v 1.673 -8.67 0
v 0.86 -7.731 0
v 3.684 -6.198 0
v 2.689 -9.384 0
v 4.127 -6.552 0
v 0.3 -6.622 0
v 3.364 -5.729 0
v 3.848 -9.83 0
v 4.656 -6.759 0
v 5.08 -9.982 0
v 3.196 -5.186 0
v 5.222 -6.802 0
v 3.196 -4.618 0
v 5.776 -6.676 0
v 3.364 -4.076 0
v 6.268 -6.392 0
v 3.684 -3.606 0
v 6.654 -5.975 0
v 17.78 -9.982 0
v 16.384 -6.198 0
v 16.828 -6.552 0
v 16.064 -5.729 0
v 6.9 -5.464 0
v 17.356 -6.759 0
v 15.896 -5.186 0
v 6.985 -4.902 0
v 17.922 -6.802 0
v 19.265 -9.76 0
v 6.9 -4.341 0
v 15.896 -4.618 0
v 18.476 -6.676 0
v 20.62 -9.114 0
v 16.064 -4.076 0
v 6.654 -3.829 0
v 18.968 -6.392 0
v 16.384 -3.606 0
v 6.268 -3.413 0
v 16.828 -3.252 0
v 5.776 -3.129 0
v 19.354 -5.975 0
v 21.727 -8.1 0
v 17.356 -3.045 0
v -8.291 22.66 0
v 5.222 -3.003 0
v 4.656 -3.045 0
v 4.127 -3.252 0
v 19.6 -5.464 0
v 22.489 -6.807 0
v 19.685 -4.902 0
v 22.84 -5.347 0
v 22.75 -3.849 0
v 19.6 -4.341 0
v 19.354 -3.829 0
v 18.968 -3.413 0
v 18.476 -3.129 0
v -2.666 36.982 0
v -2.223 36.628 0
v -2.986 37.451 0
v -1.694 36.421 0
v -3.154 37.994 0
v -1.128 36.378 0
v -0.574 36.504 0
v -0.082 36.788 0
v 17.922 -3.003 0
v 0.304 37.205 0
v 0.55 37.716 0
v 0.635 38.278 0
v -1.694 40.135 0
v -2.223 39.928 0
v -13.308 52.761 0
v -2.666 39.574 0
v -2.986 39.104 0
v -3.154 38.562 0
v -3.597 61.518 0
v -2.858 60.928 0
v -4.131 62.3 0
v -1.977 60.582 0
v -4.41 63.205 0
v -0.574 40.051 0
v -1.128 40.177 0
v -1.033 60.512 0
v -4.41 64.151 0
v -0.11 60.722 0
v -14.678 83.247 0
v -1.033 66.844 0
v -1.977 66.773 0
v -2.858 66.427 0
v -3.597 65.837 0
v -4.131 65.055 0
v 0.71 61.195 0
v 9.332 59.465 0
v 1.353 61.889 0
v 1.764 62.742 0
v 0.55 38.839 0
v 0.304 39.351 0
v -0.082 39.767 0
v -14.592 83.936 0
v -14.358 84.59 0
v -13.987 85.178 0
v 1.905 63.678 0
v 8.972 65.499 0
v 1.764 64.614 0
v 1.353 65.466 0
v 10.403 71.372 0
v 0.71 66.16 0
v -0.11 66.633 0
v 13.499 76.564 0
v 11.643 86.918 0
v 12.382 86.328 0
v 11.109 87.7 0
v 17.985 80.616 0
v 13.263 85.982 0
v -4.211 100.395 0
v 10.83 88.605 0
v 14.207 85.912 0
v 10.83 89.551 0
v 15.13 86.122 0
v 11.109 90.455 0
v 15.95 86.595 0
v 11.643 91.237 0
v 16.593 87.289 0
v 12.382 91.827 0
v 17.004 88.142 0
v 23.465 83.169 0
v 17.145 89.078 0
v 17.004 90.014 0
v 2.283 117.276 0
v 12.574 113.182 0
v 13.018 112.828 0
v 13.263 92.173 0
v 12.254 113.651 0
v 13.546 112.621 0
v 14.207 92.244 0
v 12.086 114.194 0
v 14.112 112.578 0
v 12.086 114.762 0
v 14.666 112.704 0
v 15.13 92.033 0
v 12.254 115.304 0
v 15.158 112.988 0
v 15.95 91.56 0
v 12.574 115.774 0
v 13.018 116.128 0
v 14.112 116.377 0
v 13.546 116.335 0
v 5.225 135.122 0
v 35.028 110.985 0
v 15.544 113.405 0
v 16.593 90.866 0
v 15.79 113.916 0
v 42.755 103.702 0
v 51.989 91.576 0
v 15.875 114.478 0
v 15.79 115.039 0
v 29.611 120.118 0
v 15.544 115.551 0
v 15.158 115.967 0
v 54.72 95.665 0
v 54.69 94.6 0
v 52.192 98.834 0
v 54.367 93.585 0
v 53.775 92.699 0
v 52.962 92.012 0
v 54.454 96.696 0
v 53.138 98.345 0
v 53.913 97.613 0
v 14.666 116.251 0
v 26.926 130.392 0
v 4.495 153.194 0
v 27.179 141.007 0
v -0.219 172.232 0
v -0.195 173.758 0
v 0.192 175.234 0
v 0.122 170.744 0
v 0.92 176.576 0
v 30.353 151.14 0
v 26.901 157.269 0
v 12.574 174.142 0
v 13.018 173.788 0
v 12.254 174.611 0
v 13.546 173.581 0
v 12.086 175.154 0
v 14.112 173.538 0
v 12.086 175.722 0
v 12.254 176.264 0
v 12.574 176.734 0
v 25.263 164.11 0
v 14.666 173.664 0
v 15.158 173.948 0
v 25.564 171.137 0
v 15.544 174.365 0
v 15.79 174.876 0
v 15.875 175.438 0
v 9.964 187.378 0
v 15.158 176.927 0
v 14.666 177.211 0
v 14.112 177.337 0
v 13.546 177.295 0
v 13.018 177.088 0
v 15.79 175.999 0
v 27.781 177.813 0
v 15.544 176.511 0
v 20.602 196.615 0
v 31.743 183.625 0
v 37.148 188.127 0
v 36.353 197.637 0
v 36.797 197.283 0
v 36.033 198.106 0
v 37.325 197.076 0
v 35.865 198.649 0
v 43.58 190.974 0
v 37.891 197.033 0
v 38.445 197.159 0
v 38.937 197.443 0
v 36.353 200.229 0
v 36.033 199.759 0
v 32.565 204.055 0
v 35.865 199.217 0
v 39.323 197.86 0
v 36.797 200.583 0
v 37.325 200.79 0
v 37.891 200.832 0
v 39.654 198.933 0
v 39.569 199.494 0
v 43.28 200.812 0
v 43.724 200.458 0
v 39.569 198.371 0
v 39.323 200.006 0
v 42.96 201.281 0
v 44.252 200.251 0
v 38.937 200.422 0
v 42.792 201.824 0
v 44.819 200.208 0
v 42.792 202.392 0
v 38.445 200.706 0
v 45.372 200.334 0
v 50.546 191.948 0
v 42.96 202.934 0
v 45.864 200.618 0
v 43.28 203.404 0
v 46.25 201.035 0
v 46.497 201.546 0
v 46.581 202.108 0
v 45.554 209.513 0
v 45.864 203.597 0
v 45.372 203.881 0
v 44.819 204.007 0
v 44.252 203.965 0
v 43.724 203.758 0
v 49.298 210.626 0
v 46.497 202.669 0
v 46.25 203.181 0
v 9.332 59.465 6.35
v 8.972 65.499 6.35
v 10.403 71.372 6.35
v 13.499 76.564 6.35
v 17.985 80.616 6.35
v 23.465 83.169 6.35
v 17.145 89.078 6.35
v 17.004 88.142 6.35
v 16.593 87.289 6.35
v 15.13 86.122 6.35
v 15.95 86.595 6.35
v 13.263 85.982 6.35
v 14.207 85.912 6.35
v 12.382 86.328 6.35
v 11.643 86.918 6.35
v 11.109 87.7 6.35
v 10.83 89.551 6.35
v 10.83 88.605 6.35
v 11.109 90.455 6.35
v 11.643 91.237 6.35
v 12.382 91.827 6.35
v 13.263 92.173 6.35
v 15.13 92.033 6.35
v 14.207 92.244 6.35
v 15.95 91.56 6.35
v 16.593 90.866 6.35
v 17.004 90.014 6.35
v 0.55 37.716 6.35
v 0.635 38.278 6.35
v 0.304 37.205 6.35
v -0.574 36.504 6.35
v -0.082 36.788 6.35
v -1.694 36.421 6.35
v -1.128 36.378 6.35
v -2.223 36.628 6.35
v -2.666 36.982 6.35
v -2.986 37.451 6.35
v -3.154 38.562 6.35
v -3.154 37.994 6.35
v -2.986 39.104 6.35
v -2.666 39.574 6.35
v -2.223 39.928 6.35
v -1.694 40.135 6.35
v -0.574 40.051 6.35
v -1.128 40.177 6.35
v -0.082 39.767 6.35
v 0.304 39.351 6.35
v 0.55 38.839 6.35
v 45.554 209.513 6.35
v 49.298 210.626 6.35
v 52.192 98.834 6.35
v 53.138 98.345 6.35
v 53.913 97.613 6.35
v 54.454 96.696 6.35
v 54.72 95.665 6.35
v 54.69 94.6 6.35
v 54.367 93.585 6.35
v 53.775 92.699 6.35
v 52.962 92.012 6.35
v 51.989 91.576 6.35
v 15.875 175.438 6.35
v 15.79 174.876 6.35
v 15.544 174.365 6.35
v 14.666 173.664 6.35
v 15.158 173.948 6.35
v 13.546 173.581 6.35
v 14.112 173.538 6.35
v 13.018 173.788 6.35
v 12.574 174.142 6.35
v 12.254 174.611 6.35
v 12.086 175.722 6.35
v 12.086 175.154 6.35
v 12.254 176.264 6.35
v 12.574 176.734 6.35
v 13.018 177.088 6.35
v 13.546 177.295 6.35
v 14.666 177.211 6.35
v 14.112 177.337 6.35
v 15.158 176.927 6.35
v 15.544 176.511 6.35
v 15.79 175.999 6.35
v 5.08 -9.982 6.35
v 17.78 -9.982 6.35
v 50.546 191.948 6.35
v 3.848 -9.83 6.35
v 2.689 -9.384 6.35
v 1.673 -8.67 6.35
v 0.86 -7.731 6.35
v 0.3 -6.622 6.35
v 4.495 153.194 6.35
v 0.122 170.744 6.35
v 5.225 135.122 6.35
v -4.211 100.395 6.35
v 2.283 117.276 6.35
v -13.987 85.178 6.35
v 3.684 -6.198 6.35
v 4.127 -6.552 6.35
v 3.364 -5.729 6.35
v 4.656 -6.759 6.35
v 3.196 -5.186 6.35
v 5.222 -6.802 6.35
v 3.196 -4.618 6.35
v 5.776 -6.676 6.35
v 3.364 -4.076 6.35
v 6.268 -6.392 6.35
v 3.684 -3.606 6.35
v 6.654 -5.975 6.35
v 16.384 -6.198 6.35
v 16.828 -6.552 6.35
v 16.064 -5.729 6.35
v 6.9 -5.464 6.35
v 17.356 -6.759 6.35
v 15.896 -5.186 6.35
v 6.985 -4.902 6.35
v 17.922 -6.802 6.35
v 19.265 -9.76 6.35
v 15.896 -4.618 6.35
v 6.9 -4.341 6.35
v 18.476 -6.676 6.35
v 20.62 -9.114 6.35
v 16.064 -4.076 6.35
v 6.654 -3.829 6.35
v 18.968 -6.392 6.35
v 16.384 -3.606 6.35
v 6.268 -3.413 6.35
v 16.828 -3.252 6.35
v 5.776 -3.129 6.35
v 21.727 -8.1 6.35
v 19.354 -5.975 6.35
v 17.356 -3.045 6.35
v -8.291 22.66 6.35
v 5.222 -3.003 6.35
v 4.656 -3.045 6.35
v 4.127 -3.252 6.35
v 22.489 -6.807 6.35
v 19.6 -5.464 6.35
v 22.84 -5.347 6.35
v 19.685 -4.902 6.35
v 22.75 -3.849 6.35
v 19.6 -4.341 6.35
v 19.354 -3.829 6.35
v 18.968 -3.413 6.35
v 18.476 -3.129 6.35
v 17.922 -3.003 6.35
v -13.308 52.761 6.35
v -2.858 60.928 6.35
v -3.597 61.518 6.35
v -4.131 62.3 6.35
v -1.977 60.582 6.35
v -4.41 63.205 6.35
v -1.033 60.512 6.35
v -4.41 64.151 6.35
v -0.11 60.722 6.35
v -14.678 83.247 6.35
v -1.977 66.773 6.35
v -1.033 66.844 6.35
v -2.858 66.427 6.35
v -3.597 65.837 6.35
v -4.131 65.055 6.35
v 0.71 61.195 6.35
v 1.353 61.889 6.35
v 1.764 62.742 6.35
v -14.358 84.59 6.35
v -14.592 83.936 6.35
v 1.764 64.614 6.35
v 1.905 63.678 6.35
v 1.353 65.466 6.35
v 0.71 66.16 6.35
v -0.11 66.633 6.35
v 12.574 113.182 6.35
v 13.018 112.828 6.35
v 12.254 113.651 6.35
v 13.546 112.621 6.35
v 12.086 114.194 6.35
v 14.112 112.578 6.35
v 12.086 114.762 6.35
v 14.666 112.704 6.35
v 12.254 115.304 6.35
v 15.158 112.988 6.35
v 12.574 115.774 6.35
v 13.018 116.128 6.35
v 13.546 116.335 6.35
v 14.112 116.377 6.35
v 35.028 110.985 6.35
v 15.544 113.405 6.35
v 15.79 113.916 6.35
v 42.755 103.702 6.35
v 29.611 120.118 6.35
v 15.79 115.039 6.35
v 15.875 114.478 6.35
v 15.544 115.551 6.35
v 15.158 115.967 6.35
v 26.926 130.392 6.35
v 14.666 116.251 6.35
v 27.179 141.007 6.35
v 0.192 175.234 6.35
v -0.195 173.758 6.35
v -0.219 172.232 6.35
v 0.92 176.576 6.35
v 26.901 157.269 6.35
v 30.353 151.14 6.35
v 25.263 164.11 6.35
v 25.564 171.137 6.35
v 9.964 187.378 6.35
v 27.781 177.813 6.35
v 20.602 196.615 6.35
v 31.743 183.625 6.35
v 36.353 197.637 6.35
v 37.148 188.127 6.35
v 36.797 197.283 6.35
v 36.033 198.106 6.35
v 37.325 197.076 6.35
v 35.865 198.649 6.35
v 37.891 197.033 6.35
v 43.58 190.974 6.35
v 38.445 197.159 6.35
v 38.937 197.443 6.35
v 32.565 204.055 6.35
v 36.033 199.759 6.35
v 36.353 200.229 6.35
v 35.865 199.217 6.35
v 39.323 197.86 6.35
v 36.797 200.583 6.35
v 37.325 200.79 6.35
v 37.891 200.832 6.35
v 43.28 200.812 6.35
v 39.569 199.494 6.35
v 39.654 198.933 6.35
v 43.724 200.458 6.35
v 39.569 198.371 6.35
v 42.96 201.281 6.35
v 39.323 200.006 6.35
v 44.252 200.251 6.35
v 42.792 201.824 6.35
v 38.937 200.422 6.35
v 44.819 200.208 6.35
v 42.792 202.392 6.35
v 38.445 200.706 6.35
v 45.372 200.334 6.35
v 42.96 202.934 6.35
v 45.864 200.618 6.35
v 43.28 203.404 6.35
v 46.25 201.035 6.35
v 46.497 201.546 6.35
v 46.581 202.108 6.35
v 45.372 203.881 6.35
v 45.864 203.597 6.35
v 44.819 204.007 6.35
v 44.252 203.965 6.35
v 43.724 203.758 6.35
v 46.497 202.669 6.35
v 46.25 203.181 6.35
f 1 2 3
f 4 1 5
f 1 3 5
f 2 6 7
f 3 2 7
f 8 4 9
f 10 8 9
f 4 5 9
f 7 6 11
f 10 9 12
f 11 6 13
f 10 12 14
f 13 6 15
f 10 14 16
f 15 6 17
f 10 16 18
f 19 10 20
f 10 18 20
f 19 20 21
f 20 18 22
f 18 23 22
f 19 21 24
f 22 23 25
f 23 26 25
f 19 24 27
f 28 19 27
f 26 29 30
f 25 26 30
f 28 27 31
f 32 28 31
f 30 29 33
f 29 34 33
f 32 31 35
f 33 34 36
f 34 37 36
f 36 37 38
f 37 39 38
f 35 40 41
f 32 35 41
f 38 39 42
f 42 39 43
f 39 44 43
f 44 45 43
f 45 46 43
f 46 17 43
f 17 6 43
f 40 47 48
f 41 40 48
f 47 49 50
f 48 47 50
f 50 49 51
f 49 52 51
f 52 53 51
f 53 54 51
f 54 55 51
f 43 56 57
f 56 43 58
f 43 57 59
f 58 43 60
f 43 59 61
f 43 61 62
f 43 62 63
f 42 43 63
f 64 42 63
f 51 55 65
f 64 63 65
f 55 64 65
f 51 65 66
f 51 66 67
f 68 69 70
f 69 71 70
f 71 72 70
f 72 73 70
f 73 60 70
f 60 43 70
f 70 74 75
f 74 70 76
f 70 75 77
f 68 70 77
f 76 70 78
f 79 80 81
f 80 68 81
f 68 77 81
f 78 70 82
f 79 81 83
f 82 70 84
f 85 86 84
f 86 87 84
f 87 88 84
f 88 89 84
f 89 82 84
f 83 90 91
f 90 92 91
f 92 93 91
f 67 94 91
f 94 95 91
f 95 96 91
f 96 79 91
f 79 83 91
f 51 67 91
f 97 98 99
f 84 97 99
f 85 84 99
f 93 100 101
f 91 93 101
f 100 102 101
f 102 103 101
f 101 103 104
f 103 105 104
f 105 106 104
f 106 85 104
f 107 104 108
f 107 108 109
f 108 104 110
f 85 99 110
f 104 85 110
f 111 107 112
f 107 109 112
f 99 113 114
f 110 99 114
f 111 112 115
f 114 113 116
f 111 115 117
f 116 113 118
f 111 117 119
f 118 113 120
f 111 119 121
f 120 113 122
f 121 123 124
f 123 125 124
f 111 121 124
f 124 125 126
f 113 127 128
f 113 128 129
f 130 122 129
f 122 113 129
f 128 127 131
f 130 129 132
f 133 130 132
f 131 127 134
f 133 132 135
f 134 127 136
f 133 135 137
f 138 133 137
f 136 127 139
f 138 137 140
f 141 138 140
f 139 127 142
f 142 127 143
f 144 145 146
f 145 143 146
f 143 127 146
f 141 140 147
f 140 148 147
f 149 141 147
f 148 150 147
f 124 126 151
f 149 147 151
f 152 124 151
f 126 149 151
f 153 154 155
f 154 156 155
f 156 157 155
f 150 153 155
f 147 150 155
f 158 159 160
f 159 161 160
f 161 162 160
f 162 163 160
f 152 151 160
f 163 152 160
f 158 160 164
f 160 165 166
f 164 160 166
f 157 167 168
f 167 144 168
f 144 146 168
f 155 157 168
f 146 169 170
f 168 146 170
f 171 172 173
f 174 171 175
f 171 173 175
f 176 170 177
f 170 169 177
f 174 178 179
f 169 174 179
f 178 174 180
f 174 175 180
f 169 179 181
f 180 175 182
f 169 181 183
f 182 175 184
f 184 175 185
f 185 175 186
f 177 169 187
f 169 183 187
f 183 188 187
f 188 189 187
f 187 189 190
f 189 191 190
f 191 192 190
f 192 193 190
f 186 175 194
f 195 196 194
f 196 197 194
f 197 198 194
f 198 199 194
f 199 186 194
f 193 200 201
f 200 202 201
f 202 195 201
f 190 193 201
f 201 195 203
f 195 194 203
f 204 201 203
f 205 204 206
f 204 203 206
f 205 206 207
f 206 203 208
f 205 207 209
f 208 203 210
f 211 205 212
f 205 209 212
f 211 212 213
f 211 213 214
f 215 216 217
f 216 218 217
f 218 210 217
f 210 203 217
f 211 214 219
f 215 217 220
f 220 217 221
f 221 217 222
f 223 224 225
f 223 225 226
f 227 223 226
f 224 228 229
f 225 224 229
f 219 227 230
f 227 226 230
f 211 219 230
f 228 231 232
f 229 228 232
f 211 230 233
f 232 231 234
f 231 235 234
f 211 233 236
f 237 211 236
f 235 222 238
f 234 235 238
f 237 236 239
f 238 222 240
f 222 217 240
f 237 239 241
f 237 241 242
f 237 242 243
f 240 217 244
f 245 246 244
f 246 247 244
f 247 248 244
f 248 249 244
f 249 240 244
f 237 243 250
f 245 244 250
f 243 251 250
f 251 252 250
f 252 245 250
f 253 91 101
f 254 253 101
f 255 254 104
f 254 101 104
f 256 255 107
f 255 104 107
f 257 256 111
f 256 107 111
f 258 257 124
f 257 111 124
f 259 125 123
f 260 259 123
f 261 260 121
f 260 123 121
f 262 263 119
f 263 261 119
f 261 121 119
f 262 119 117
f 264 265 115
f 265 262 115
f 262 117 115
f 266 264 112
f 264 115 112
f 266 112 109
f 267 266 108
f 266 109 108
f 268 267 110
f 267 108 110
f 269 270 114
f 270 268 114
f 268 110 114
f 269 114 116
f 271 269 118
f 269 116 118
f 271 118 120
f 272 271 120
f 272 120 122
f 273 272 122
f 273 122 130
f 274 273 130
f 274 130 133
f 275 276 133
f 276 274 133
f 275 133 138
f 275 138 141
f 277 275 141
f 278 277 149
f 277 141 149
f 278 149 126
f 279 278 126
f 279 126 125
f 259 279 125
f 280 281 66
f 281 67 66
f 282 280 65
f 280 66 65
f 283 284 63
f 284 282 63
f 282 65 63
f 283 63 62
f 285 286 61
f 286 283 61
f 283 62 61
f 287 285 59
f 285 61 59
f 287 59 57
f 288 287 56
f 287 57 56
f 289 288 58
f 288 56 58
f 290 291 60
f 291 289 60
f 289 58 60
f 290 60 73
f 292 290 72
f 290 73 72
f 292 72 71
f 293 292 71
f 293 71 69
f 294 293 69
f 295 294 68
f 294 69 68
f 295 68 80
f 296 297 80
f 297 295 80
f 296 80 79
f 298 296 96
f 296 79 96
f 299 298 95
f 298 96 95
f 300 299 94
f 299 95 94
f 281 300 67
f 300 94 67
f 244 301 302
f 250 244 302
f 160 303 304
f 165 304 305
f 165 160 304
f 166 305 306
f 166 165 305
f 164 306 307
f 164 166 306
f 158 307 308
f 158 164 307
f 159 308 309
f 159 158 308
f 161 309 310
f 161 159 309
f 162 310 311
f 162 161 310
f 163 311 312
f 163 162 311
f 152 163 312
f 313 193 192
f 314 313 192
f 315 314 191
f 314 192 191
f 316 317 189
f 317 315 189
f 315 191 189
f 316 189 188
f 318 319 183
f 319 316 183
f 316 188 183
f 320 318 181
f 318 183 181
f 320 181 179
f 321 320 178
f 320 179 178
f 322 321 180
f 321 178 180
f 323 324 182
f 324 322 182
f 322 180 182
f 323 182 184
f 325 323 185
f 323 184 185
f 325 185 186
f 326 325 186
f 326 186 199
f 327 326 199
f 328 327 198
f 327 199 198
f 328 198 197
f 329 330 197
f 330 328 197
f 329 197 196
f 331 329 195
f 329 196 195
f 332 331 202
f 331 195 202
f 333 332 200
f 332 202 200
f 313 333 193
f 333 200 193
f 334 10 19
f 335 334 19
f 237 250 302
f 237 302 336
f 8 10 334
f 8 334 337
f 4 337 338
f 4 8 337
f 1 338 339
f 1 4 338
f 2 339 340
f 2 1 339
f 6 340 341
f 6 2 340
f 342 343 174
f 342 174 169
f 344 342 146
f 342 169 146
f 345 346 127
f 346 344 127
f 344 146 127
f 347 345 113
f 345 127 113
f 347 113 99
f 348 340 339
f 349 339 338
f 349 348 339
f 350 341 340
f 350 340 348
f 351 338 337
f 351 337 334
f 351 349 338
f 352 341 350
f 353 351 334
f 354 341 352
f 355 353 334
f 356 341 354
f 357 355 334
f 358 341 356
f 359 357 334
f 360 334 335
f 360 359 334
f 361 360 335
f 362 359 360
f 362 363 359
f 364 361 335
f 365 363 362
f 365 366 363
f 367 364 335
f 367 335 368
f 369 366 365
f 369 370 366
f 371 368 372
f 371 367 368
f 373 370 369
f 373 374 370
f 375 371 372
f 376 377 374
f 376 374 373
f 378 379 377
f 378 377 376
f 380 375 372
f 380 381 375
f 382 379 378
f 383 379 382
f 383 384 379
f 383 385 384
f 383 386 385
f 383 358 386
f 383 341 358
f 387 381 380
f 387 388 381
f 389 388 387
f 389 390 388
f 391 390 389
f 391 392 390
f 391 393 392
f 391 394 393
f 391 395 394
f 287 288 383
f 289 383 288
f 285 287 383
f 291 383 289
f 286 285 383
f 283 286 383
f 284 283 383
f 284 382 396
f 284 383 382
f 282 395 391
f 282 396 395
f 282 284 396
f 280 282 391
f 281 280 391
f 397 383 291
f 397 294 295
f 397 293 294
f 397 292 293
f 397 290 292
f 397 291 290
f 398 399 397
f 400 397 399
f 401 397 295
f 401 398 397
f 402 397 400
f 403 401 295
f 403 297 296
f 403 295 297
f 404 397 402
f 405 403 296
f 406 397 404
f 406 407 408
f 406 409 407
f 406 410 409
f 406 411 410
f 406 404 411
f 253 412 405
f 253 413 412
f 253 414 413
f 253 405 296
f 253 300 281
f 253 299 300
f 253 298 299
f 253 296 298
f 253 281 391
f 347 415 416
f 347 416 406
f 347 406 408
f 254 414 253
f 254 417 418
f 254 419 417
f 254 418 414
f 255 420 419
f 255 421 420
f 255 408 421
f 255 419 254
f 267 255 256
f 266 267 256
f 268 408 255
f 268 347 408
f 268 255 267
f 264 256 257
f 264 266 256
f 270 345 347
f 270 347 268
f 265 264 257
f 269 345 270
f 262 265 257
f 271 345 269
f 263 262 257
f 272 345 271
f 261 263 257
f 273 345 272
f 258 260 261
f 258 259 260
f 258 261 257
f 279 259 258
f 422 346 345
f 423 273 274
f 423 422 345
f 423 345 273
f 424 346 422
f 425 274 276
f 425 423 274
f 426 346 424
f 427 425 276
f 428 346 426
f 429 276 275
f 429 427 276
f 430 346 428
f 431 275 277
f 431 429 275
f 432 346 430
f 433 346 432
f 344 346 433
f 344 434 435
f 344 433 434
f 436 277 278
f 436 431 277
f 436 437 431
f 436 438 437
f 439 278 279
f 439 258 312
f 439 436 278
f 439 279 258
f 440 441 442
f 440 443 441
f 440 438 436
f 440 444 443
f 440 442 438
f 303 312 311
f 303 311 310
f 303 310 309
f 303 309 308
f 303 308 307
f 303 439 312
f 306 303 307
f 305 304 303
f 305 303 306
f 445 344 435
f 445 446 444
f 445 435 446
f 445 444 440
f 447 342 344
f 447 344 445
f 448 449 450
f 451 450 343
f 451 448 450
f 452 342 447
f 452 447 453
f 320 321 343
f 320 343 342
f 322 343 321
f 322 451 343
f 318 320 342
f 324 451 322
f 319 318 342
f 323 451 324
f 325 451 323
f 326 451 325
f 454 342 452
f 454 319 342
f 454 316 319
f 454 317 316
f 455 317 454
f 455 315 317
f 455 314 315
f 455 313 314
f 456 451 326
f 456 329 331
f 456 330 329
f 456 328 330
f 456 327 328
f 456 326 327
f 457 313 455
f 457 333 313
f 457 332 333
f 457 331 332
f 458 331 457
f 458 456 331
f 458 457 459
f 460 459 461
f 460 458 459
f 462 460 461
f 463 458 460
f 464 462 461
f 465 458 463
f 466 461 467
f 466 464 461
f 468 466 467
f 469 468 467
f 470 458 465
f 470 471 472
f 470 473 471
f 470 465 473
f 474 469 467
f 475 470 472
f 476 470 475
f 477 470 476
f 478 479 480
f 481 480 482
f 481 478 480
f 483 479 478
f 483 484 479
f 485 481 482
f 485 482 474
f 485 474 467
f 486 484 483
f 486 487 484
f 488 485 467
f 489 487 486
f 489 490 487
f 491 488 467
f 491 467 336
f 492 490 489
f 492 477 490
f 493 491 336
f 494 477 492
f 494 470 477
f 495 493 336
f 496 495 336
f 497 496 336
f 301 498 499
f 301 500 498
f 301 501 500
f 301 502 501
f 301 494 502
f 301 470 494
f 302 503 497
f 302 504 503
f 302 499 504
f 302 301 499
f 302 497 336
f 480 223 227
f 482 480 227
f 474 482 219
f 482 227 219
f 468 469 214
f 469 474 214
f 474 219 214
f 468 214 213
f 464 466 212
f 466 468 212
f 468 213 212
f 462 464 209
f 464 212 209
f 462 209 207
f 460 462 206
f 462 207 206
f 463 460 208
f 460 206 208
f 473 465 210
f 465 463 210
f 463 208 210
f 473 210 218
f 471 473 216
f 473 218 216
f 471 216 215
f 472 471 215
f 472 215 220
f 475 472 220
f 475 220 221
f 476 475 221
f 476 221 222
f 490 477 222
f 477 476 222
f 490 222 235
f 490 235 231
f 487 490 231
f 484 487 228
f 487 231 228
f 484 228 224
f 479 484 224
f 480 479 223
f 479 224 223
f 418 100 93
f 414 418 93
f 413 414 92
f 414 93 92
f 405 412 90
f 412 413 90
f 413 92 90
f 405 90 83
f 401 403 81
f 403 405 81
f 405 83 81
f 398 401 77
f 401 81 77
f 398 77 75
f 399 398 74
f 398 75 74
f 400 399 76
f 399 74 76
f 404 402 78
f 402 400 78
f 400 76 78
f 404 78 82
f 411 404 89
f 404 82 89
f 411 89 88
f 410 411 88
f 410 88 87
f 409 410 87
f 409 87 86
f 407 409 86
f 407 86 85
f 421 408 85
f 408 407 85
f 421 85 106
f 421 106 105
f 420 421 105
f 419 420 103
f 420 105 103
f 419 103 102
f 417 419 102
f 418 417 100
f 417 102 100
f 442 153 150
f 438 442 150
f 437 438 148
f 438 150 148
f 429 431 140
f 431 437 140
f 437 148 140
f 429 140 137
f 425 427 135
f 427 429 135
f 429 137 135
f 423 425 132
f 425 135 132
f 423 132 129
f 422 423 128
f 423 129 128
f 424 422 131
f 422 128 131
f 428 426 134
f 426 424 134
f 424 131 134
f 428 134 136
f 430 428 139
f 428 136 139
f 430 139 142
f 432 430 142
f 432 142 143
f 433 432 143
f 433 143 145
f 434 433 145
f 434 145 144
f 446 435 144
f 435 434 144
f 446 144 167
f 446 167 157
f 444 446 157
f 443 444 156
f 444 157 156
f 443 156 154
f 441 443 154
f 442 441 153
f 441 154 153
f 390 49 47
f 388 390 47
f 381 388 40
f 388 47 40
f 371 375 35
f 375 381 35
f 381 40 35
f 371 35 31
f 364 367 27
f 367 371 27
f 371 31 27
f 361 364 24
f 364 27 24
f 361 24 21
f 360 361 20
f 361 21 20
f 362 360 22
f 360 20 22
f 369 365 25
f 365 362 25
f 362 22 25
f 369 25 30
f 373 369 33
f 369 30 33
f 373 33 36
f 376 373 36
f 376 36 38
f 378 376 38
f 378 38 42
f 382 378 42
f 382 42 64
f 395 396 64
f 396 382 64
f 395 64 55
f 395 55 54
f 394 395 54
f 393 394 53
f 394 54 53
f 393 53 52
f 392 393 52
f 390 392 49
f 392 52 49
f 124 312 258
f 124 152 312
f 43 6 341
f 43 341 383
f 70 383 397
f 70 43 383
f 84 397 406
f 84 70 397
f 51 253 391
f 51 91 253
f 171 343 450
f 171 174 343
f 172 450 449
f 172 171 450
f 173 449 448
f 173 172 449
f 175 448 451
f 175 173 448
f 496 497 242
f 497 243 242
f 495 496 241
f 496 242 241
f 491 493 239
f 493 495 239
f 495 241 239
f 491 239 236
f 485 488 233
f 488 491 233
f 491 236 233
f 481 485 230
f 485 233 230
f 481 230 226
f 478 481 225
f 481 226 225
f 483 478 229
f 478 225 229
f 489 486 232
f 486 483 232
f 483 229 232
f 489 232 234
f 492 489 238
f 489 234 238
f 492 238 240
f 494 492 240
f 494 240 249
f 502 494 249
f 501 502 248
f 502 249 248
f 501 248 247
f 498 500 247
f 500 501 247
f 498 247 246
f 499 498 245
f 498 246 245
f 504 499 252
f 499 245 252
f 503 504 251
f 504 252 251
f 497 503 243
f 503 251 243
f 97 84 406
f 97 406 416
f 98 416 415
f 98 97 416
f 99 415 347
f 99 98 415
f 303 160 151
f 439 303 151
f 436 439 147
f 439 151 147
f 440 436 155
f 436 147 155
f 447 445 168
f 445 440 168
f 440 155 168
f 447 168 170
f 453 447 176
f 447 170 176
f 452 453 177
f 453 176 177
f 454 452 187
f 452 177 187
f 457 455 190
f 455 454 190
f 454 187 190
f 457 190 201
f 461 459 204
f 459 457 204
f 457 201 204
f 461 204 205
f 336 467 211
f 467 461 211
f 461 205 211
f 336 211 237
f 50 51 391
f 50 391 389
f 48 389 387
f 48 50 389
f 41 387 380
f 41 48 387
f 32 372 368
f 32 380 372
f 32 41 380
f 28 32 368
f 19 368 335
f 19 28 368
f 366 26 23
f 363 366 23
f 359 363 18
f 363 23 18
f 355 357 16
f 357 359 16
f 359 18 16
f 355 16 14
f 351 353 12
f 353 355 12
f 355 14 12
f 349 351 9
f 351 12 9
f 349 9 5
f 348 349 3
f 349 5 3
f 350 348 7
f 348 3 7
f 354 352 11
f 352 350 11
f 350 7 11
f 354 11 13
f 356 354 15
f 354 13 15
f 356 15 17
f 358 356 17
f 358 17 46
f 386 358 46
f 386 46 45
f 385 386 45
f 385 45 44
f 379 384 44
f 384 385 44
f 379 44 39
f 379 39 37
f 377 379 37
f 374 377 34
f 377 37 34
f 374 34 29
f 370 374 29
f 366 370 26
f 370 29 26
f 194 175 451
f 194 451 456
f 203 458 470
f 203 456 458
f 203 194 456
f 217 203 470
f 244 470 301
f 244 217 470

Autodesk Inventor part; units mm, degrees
ref_plane "YZ Plane" through (0, 0, 0) normal (1, 0, 0) x (0, 1, 0)
ref_plane "XZ Plane" through (0, 0, 0) normal (0, 1, 0) x (-1, 0, 0)
ref_plane "XY Plane" through (0, 0, 0) normal (0, 0, 1) x (1, 0, 0)
sketch "Sketch1" plane through (0, 0, 0) normal (0, 0, 1) x (1, 0, 0)
  line L0 (-50.8, -25.4) -> (76.2, -25.4)
  line L1 (76.2, -25.4) -> (76.2, 228.6)
  line L2 (76.2, 228.6) -> (-51.6296, 228.6)
  circle A0 centre (5.08, -4.9022) radius 1.905
  circle A1 centre (-1.27, 63.6778) radius 3.175
  circle A2 centre (13.97, 89.0778) radius 3.175
  arc A3 (23.4649, 83.1687) -> (9.3315, 59.465) centre (29.21, 63.6778) ccw
  arc A4 (0.3002, -6.6225) -> (5.08, -9.9822) centre (5.08, -4.9022) ccw
  line L3 (5.08, -9.9822) -> (17.78, -9.9822)
  arc A5 (17.78, -9.9822) -> (22.7496, -3.849) centre (17.78, -4.9022) ccw
  line L4 (9.3315, 59.465) -> (22.7496, -3.849)
  arc A6 (-14.6784, 83.2471) -> (0.3002, -6.6225) centre (239.2924, 79.3933) ccw
  arc A7 (50.546, 191.9478) -> (30.3529, 151.1401) centre (50.546, 166.5478) ccw
  line L5 (50.546, 191.9478) -> (50.546, 210.9978)
  arc A8 (0.9197, 176.5759) -> (0.1225, 170.7438) centre (6.096, 172.8978) ccw
  arc A9 (50.546, 210.9978) -> (0.9197, 176.5759) centre (73.3878, 125.0824) ccw
  arc A10 (-13.9866, 85.1779) -> (0.1225, 170.7438) centre (-83.5064, 140.5873) ccw
  arc A11 (-13.9866, 85.1779) -> (-14.6784, 83.2471) centre (-11.5038, 83.199) ccw
  circle A12 centre (17.78, -4.9022) radius 1.905
  arc A13 (76.2, 171.1429) -> (75.486, 171.3598) centre (64.77, 134.7978) ccw
  arc A14 (30.3529, 151.1401) -> (52.1919, 98.8339) centre (64.77, 134.7978) ccw
  line L6 (-51.6296, 228.6) -> (-51.6296, 223.5757)
  line L7 (-50.8, -9.9822) -> (-50.8, -25.4)
  line L8 (45.5539, 209.5127) -> (50.546, 210.9978)
  arc A15 (55.9788, 92.7525) -> (55.982, 92.7794) centre (50.3052, 93.4393) ccw
  line L9 (48.0499, 210.2553) -> (50.546, 210.9978)
  line L10 (49.298, 210.6265) -> (50.546, 191.9478)
  line L11 (49.298, 210.6265) -> (49.1762, 210.5903)
  line L12 (49.1762, 210.5903) -> (50.546, 191.9478)
  arc A16 (51.9893, 91.5765) -> (52.1919, 98.8339) centre (50.9341, 95.2375) ccw
  line L13 (45.9382, 89.7529) -> (52.0334, 91.5895)
  line L14 (52.0334, 91.5895) -> (23.4649, 83.1687)
  circle A17 centre (13.97, 114.4778) radius 1.905
  circle A18 centre (13.97, 175.4378) radius 1.905
  circle A19 centre (44.6762, 202.1078) radius 1.905
  circle A20 centre (37.7491, 198.9328) radius 1.905
  circle A21 centre (-1.27, 38.2778) radius 1.905
  point P0 (0, 0)
  point P1 (50.546, 87.6896)
  dimension "d1" = 76.2
  dimension "d2" = 25.4
  dimension "d3" = 228.6
  dimension "d5" = 20.4978
  dimension "d6" = 3.81
  dimension "d7" = 6.35
  dimension "d8" = 89.0778
  dimension "d10" = 6.35
  dimension "d11" = 25.4
  dimension "d12" = 15.24
  dimension "d13" = 30.48
  dimension "d14" = 0
  dimension "d15" = 71.12
  dimension "d16" = 35.56
  dimension "d18" = 40.64
  dimension "d22" = 10.16
  dimension "d23" = 12.7
  dimension "d24" = 10.16
  dimension "d28" = 254
  dimension "d29" = 50.8
  dimension "d30" = 14.224
  dimension "d31" = 31.75
  dimension "d33" = 12.7
  dimension "d34" = 44.45
  dimension "d35" = 38.1
  dimension "d36" = 88.9
  dimension "d37" = 88.9
  dimension "d38" = 3.175
  dimension "d39" = 3.81
  dimension "d43" = 5.08
  dimension "d49" = 11.43
  dimension "d50" = 0.127
  dimension "d53" = 1.27
  dimension "d54" = 19.05
  dimension "d55" = 7.62
  dimension "d56" = 3.81
  dimension "d57" = 25.4
  dimension "d58" = 3.81
  dimension "d59" = 60.96
  dimension "d62" = 3.81
  dimension "d63" = 3.81
  dimension "d64" = 7.62
  dimension "d65" = 10.16
  dimension "d66" = 6.985
  dimension "d67" = 3.81
  dimension "d68" = 25.4
extrude "Extrusion6" add sketch "Sketch1" along normal blind 6.35 contours A3 L4 A5 L3 A4 A6 A11 A10 A8 A9 L8 L12 A7 A14 A16 L14 | L12 L8 L10
properties part number "One piece claw 1.0"
